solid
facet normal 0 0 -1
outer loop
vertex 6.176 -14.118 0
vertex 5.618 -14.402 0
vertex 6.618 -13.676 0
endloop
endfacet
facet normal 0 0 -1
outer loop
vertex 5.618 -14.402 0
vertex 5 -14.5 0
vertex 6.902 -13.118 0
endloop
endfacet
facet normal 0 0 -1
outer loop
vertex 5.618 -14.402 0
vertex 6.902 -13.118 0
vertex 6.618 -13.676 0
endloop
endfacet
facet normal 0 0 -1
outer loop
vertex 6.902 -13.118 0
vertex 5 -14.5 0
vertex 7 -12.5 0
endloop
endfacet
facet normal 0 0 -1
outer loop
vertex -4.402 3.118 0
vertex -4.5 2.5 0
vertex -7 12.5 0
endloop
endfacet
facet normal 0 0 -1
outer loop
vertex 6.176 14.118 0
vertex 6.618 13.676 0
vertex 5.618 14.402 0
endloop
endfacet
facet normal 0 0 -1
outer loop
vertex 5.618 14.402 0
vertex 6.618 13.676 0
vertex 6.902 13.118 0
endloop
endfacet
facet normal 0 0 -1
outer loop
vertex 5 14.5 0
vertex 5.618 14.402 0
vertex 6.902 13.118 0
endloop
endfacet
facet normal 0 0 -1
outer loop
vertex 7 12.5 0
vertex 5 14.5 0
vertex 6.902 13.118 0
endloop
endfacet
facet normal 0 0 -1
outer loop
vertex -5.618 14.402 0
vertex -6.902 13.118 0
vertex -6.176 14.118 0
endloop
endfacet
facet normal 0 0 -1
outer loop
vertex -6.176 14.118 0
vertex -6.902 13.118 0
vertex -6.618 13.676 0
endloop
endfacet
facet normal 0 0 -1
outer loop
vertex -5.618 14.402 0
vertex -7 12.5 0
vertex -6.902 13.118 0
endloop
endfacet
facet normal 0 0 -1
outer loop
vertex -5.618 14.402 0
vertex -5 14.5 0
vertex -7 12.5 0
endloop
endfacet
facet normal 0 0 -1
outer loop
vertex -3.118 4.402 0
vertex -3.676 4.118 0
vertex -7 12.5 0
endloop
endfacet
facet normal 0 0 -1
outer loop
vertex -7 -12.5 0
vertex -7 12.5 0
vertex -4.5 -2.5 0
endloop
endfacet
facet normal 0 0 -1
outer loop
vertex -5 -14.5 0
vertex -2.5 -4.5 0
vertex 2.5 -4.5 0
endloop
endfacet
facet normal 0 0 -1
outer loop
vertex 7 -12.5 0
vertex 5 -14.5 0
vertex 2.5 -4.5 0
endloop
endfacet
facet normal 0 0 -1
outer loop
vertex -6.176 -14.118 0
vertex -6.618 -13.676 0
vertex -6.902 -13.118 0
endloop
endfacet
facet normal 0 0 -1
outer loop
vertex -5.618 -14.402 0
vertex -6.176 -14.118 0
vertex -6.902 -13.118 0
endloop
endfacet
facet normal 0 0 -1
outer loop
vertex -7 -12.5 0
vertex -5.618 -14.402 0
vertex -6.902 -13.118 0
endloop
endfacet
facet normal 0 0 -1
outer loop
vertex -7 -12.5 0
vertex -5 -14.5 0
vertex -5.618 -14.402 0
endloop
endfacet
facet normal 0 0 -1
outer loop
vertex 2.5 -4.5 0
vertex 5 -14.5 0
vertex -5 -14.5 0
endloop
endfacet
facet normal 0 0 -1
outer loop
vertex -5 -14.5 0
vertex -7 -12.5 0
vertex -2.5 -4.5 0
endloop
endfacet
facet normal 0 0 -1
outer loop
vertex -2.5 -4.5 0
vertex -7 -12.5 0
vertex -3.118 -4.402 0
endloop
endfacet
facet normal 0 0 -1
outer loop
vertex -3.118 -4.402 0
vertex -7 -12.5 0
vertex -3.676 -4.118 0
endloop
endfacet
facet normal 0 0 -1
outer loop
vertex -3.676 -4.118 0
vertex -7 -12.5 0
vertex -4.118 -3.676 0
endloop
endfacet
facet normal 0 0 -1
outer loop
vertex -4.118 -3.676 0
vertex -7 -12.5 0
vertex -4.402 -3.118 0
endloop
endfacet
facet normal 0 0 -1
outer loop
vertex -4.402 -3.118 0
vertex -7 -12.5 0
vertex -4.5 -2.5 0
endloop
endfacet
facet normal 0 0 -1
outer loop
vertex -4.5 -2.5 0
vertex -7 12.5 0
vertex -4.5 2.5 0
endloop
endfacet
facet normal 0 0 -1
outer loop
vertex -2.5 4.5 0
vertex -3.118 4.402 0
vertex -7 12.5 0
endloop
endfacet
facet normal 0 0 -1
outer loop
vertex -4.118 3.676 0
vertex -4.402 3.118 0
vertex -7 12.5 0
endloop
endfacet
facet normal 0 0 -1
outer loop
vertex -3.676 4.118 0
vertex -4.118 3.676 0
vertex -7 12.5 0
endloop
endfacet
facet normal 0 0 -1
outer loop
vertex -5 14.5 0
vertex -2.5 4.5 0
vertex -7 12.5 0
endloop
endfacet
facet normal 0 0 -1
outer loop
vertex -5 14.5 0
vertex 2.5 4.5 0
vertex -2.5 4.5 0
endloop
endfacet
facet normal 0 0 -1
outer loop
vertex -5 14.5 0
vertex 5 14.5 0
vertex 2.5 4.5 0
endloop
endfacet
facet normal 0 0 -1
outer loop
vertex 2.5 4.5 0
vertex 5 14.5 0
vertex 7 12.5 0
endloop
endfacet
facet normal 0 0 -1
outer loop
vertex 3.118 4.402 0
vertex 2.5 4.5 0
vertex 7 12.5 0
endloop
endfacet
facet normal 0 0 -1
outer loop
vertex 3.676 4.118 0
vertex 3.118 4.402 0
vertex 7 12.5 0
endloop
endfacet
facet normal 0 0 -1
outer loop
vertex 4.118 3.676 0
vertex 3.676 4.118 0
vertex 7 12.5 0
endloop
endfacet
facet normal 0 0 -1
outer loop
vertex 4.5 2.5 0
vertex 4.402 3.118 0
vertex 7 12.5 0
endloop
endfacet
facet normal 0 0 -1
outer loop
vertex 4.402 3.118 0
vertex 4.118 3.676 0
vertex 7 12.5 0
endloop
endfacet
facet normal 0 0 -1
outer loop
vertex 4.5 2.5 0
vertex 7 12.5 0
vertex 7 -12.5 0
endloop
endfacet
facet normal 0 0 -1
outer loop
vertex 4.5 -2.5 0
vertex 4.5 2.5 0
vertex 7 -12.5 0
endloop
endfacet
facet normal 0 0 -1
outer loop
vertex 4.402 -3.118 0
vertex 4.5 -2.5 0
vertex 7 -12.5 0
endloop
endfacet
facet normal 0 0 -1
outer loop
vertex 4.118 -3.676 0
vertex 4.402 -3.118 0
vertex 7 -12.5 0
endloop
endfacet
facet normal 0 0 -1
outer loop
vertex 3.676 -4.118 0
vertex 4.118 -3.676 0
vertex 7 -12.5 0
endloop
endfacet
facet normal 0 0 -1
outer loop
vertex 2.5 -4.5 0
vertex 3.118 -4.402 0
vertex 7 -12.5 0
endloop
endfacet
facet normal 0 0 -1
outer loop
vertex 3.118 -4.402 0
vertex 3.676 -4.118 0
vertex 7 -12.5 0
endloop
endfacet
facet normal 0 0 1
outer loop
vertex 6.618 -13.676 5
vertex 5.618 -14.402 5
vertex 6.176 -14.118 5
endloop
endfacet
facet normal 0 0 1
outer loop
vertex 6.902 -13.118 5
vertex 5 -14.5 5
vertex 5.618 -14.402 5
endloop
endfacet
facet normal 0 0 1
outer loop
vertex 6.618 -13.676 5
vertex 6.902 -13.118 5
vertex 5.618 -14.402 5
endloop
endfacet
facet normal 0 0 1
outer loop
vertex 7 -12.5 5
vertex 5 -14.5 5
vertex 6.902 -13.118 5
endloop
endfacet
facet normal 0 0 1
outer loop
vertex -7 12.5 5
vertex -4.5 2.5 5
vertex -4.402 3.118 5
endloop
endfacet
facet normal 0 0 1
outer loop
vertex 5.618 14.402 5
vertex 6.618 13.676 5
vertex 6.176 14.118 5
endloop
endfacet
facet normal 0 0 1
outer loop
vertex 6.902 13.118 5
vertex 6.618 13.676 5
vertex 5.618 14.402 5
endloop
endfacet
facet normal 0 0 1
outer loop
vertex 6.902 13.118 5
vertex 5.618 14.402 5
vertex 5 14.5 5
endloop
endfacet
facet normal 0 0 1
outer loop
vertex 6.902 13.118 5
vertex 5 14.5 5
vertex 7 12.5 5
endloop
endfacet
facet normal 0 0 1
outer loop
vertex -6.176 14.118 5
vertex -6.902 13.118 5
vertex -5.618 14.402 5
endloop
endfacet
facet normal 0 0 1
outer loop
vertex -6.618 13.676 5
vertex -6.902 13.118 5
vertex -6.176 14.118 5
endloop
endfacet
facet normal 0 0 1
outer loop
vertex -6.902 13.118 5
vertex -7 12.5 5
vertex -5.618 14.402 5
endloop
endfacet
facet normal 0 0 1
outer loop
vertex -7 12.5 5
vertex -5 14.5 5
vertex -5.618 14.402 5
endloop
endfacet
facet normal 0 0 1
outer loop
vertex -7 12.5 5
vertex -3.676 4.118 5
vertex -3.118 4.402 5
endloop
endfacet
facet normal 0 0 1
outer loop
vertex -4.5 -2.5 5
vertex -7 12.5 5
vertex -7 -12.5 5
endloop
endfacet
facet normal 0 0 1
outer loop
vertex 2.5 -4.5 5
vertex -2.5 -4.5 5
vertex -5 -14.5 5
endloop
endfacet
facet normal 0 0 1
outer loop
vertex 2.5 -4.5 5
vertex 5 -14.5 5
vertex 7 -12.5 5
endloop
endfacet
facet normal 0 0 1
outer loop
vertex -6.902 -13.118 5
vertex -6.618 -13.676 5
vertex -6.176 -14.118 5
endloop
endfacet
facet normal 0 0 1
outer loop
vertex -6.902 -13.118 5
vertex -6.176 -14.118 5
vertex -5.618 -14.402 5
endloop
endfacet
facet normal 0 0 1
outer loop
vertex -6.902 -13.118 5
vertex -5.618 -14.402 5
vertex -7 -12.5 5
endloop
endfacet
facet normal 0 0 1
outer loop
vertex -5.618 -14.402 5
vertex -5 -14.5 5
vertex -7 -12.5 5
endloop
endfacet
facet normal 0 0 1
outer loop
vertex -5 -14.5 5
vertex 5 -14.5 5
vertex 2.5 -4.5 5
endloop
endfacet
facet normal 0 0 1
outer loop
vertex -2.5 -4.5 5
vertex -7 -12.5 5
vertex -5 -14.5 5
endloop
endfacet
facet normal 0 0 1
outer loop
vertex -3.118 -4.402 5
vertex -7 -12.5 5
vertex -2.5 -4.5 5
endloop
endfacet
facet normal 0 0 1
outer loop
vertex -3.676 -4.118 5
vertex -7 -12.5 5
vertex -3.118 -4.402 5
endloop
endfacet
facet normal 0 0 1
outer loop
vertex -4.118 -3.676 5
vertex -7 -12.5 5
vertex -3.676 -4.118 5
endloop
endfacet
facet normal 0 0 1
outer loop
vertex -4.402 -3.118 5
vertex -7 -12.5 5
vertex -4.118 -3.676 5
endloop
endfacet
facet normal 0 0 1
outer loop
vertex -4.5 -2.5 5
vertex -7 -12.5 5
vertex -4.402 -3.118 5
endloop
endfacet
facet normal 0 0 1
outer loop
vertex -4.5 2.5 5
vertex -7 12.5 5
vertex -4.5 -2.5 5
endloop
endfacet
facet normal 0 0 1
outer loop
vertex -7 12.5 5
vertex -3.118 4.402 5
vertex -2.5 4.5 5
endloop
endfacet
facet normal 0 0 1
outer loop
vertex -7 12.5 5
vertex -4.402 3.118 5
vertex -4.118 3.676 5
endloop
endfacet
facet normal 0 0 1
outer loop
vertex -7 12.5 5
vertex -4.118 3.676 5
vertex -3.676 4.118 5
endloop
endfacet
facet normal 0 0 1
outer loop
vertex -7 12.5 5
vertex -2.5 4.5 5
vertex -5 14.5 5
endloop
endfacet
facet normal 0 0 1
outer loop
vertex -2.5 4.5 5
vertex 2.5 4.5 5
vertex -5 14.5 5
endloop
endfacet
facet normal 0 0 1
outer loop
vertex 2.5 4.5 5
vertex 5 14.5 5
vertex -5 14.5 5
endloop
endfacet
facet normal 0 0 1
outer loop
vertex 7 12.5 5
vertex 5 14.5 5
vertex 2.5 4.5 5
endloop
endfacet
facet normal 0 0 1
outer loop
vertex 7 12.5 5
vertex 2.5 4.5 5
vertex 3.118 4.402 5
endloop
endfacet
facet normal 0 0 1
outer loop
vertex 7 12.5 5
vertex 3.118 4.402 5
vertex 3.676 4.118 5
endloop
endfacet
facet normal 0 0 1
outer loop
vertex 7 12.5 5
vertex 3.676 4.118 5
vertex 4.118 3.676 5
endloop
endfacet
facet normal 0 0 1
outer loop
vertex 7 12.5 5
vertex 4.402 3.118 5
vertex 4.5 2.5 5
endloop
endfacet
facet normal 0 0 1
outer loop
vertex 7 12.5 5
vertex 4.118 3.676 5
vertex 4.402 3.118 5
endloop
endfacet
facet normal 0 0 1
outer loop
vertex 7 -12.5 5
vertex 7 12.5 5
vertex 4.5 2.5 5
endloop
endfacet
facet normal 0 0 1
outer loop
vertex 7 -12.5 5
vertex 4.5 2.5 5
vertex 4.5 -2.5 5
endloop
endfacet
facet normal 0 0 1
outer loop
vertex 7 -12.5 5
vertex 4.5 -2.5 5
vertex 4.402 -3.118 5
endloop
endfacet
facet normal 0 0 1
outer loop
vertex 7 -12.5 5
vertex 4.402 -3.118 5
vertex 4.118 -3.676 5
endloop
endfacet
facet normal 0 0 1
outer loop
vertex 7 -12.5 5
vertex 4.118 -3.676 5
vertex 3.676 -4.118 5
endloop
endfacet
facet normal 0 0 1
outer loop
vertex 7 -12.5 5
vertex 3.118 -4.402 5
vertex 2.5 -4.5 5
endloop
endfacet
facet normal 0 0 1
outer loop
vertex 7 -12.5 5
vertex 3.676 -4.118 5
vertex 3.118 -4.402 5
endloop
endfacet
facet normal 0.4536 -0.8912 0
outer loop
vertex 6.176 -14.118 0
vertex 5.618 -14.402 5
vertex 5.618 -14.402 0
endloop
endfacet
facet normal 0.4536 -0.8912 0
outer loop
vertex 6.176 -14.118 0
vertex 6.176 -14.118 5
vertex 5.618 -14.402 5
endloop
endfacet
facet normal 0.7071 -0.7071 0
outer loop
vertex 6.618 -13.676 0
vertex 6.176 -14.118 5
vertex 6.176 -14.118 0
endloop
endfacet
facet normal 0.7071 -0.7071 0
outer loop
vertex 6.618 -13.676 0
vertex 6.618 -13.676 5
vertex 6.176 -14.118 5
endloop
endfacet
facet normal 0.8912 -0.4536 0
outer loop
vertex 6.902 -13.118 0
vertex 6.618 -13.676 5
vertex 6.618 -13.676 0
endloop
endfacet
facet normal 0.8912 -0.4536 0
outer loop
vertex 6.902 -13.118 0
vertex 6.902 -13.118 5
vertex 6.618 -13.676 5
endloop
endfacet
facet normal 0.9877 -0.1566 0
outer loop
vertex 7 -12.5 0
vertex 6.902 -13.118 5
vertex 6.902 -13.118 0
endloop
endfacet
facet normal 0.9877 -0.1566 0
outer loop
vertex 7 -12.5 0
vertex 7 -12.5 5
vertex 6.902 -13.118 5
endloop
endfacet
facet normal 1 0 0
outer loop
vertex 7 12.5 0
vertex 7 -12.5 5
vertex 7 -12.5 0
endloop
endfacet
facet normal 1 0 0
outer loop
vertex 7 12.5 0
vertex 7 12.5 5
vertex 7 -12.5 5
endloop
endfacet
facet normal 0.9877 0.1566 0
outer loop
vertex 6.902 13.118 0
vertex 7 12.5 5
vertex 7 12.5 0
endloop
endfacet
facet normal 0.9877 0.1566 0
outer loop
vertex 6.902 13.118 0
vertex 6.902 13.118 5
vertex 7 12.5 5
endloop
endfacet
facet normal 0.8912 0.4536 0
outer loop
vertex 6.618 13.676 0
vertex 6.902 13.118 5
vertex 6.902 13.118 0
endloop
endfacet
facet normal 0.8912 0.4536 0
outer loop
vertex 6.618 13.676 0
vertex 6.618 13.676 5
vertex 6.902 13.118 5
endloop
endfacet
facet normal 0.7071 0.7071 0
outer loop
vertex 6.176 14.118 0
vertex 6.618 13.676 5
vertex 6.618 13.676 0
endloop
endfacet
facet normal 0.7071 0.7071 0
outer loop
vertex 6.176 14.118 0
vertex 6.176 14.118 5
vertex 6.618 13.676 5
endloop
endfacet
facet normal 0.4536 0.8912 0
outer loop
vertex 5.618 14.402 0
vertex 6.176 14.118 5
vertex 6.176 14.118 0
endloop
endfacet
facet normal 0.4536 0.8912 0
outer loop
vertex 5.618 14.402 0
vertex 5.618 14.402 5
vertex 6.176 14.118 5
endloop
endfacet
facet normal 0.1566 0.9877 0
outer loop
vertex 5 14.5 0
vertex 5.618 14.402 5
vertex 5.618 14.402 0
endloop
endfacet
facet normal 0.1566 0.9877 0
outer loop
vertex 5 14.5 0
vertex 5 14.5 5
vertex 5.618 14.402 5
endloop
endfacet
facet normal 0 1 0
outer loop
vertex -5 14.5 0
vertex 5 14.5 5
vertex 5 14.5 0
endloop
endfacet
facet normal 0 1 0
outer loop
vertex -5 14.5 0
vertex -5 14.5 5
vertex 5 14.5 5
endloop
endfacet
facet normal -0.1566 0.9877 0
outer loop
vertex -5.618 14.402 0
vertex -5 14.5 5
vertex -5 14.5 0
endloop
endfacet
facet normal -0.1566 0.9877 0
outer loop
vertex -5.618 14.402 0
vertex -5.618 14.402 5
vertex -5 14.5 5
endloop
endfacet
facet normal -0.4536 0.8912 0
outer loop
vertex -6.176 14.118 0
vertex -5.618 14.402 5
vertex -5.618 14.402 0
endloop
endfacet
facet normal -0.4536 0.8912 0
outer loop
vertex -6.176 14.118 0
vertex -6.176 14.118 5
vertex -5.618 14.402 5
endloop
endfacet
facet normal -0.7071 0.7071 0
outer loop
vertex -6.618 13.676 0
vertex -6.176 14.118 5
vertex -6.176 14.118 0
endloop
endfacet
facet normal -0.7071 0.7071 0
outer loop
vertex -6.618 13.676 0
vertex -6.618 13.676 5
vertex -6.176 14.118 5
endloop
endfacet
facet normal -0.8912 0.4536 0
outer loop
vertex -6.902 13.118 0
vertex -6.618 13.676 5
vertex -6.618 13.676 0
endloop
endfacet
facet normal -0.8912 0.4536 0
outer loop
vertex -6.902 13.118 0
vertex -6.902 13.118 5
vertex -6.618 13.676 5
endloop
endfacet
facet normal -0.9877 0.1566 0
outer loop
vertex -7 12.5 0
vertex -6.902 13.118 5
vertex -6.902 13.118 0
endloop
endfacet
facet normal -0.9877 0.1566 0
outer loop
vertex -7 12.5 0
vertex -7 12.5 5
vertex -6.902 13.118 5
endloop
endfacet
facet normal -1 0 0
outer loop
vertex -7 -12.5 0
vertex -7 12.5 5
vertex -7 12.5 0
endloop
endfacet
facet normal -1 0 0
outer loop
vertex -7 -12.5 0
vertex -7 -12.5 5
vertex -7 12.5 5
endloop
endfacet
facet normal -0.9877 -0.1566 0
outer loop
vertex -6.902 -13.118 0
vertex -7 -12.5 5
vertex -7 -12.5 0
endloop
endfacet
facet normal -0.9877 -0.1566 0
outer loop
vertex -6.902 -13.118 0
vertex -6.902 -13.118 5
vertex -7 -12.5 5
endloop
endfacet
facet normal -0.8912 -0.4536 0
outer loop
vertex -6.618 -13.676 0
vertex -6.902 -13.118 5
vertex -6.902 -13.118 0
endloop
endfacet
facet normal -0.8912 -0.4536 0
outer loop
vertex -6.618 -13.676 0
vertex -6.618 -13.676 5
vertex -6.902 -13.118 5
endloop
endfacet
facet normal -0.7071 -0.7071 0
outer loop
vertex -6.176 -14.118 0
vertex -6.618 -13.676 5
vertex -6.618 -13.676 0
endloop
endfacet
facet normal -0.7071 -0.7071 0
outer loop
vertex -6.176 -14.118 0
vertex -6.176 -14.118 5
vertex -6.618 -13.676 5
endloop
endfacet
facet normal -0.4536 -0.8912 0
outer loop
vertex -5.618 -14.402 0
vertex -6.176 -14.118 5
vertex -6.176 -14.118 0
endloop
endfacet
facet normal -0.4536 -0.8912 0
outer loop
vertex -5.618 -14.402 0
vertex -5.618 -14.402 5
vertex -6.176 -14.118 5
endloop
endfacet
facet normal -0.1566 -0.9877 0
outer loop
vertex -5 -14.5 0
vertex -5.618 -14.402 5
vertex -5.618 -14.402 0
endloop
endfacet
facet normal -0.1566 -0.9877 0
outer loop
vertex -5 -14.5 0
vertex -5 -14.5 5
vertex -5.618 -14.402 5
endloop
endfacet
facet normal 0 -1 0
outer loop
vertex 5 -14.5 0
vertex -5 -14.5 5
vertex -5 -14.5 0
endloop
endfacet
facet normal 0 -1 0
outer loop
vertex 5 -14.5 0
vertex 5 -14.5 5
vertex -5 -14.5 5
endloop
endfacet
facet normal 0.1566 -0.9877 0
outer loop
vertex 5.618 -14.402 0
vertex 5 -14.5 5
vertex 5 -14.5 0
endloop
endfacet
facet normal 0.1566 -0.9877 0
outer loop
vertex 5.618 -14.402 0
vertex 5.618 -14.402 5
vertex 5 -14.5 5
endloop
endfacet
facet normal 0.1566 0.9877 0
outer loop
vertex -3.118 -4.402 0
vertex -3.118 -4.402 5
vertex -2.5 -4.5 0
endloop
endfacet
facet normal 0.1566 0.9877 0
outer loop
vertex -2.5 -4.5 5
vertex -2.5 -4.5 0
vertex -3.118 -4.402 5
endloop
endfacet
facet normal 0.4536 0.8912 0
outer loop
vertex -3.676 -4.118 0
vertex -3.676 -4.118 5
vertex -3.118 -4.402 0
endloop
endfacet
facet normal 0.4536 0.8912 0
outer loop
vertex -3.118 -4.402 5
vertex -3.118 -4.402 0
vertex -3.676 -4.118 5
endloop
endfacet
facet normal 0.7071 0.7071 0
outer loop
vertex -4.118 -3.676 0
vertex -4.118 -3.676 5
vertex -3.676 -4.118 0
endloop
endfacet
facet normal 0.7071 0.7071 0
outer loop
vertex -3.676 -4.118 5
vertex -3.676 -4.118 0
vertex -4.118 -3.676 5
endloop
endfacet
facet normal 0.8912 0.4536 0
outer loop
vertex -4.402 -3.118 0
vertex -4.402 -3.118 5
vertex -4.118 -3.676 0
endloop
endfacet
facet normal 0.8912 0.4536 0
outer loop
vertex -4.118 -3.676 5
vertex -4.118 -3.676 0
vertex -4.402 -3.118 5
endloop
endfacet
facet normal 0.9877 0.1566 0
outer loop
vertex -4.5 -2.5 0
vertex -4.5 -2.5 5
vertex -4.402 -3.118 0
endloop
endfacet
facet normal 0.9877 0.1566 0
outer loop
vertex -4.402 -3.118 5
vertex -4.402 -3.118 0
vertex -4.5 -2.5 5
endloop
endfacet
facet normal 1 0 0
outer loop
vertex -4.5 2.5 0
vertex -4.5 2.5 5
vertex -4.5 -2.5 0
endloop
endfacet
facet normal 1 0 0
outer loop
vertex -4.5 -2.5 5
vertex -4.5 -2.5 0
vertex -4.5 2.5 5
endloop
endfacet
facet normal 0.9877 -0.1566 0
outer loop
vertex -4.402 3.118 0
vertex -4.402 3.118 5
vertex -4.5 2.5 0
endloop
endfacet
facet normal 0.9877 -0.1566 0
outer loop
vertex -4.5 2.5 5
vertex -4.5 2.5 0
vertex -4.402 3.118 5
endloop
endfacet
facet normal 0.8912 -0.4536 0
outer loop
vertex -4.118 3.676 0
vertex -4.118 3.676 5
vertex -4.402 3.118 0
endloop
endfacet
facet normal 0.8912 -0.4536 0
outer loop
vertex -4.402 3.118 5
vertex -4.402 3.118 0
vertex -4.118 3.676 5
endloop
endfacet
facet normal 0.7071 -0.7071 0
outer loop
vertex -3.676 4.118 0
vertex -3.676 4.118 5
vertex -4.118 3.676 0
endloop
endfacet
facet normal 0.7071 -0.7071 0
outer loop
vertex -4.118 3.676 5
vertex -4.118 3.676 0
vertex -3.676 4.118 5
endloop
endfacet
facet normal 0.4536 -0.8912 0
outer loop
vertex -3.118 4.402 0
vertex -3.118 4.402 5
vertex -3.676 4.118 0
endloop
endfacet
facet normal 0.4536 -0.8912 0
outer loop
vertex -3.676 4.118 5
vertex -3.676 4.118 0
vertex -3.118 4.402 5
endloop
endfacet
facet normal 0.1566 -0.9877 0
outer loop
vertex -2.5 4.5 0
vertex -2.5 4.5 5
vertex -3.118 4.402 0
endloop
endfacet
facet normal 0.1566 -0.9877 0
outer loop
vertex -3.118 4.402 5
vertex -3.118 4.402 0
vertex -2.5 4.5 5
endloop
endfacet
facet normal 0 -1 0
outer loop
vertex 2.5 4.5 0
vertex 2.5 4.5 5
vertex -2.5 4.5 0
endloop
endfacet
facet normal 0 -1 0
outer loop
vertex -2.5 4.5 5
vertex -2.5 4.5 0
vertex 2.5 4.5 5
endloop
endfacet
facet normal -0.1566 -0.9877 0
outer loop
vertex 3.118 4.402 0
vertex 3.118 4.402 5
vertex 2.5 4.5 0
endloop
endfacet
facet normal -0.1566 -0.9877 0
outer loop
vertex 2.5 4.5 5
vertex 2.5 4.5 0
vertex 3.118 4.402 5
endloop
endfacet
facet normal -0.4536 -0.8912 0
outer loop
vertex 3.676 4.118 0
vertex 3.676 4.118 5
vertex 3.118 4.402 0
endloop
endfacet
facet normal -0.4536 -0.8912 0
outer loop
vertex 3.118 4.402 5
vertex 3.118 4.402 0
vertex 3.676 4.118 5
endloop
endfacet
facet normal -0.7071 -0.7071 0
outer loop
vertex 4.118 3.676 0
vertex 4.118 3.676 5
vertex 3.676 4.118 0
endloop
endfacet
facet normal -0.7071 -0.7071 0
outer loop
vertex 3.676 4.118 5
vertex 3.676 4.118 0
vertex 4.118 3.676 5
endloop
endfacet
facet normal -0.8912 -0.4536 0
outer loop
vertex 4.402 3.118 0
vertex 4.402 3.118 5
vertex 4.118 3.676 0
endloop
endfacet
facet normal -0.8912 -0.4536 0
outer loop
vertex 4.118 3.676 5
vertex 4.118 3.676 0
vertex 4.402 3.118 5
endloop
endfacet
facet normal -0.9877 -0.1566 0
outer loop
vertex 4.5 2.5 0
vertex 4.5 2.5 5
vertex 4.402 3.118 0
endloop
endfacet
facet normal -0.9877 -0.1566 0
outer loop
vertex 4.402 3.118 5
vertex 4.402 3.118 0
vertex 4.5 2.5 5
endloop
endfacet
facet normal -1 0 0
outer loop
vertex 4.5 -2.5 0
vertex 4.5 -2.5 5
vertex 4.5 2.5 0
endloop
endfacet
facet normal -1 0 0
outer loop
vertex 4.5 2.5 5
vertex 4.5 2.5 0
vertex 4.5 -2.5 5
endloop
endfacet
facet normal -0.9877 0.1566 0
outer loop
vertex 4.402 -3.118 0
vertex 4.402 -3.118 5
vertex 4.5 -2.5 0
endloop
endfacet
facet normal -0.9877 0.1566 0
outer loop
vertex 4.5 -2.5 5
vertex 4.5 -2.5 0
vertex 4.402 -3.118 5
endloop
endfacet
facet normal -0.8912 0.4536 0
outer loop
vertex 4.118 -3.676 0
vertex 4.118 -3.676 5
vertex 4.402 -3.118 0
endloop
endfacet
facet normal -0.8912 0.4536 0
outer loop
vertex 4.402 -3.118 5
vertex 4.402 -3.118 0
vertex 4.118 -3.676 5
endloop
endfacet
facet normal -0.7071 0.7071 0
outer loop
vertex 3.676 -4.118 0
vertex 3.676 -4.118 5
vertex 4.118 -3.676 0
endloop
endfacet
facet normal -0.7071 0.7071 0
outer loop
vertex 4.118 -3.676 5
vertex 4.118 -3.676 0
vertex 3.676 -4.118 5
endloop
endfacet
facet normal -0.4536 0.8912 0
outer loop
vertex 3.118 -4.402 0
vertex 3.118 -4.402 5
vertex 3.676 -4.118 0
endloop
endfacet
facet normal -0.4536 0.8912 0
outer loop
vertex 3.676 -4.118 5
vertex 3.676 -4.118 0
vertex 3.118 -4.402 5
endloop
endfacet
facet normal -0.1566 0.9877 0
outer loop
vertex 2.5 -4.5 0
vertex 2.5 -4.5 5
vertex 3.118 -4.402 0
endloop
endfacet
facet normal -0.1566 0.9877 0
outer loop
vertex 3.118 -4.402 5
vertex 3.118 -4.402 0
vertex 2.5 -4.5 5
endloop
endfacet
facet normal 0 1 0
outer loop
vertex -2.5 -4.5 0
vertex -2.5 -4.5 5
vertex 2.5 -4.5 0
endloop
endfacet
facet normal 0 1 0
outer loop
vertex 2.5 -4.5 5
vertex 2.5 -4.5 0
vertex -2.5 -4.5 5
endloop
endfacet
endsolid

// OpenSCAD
// this is kind of nice. an inner and outer polyline
// that gets extruded.
// note that before linear_extrude a 2d square or circle is padded
// with height of 1

$fn = 20;
 
 

 linear_extrude(5) { 
 
  difference() { 
         
     minkowski() {    
      square( [10, 25 ], center = true);
      circle(2);
      }
 
            
     minkowski() {    
      square( [5, 5 ], center = true);
      circle(2);
      }
  }
}
